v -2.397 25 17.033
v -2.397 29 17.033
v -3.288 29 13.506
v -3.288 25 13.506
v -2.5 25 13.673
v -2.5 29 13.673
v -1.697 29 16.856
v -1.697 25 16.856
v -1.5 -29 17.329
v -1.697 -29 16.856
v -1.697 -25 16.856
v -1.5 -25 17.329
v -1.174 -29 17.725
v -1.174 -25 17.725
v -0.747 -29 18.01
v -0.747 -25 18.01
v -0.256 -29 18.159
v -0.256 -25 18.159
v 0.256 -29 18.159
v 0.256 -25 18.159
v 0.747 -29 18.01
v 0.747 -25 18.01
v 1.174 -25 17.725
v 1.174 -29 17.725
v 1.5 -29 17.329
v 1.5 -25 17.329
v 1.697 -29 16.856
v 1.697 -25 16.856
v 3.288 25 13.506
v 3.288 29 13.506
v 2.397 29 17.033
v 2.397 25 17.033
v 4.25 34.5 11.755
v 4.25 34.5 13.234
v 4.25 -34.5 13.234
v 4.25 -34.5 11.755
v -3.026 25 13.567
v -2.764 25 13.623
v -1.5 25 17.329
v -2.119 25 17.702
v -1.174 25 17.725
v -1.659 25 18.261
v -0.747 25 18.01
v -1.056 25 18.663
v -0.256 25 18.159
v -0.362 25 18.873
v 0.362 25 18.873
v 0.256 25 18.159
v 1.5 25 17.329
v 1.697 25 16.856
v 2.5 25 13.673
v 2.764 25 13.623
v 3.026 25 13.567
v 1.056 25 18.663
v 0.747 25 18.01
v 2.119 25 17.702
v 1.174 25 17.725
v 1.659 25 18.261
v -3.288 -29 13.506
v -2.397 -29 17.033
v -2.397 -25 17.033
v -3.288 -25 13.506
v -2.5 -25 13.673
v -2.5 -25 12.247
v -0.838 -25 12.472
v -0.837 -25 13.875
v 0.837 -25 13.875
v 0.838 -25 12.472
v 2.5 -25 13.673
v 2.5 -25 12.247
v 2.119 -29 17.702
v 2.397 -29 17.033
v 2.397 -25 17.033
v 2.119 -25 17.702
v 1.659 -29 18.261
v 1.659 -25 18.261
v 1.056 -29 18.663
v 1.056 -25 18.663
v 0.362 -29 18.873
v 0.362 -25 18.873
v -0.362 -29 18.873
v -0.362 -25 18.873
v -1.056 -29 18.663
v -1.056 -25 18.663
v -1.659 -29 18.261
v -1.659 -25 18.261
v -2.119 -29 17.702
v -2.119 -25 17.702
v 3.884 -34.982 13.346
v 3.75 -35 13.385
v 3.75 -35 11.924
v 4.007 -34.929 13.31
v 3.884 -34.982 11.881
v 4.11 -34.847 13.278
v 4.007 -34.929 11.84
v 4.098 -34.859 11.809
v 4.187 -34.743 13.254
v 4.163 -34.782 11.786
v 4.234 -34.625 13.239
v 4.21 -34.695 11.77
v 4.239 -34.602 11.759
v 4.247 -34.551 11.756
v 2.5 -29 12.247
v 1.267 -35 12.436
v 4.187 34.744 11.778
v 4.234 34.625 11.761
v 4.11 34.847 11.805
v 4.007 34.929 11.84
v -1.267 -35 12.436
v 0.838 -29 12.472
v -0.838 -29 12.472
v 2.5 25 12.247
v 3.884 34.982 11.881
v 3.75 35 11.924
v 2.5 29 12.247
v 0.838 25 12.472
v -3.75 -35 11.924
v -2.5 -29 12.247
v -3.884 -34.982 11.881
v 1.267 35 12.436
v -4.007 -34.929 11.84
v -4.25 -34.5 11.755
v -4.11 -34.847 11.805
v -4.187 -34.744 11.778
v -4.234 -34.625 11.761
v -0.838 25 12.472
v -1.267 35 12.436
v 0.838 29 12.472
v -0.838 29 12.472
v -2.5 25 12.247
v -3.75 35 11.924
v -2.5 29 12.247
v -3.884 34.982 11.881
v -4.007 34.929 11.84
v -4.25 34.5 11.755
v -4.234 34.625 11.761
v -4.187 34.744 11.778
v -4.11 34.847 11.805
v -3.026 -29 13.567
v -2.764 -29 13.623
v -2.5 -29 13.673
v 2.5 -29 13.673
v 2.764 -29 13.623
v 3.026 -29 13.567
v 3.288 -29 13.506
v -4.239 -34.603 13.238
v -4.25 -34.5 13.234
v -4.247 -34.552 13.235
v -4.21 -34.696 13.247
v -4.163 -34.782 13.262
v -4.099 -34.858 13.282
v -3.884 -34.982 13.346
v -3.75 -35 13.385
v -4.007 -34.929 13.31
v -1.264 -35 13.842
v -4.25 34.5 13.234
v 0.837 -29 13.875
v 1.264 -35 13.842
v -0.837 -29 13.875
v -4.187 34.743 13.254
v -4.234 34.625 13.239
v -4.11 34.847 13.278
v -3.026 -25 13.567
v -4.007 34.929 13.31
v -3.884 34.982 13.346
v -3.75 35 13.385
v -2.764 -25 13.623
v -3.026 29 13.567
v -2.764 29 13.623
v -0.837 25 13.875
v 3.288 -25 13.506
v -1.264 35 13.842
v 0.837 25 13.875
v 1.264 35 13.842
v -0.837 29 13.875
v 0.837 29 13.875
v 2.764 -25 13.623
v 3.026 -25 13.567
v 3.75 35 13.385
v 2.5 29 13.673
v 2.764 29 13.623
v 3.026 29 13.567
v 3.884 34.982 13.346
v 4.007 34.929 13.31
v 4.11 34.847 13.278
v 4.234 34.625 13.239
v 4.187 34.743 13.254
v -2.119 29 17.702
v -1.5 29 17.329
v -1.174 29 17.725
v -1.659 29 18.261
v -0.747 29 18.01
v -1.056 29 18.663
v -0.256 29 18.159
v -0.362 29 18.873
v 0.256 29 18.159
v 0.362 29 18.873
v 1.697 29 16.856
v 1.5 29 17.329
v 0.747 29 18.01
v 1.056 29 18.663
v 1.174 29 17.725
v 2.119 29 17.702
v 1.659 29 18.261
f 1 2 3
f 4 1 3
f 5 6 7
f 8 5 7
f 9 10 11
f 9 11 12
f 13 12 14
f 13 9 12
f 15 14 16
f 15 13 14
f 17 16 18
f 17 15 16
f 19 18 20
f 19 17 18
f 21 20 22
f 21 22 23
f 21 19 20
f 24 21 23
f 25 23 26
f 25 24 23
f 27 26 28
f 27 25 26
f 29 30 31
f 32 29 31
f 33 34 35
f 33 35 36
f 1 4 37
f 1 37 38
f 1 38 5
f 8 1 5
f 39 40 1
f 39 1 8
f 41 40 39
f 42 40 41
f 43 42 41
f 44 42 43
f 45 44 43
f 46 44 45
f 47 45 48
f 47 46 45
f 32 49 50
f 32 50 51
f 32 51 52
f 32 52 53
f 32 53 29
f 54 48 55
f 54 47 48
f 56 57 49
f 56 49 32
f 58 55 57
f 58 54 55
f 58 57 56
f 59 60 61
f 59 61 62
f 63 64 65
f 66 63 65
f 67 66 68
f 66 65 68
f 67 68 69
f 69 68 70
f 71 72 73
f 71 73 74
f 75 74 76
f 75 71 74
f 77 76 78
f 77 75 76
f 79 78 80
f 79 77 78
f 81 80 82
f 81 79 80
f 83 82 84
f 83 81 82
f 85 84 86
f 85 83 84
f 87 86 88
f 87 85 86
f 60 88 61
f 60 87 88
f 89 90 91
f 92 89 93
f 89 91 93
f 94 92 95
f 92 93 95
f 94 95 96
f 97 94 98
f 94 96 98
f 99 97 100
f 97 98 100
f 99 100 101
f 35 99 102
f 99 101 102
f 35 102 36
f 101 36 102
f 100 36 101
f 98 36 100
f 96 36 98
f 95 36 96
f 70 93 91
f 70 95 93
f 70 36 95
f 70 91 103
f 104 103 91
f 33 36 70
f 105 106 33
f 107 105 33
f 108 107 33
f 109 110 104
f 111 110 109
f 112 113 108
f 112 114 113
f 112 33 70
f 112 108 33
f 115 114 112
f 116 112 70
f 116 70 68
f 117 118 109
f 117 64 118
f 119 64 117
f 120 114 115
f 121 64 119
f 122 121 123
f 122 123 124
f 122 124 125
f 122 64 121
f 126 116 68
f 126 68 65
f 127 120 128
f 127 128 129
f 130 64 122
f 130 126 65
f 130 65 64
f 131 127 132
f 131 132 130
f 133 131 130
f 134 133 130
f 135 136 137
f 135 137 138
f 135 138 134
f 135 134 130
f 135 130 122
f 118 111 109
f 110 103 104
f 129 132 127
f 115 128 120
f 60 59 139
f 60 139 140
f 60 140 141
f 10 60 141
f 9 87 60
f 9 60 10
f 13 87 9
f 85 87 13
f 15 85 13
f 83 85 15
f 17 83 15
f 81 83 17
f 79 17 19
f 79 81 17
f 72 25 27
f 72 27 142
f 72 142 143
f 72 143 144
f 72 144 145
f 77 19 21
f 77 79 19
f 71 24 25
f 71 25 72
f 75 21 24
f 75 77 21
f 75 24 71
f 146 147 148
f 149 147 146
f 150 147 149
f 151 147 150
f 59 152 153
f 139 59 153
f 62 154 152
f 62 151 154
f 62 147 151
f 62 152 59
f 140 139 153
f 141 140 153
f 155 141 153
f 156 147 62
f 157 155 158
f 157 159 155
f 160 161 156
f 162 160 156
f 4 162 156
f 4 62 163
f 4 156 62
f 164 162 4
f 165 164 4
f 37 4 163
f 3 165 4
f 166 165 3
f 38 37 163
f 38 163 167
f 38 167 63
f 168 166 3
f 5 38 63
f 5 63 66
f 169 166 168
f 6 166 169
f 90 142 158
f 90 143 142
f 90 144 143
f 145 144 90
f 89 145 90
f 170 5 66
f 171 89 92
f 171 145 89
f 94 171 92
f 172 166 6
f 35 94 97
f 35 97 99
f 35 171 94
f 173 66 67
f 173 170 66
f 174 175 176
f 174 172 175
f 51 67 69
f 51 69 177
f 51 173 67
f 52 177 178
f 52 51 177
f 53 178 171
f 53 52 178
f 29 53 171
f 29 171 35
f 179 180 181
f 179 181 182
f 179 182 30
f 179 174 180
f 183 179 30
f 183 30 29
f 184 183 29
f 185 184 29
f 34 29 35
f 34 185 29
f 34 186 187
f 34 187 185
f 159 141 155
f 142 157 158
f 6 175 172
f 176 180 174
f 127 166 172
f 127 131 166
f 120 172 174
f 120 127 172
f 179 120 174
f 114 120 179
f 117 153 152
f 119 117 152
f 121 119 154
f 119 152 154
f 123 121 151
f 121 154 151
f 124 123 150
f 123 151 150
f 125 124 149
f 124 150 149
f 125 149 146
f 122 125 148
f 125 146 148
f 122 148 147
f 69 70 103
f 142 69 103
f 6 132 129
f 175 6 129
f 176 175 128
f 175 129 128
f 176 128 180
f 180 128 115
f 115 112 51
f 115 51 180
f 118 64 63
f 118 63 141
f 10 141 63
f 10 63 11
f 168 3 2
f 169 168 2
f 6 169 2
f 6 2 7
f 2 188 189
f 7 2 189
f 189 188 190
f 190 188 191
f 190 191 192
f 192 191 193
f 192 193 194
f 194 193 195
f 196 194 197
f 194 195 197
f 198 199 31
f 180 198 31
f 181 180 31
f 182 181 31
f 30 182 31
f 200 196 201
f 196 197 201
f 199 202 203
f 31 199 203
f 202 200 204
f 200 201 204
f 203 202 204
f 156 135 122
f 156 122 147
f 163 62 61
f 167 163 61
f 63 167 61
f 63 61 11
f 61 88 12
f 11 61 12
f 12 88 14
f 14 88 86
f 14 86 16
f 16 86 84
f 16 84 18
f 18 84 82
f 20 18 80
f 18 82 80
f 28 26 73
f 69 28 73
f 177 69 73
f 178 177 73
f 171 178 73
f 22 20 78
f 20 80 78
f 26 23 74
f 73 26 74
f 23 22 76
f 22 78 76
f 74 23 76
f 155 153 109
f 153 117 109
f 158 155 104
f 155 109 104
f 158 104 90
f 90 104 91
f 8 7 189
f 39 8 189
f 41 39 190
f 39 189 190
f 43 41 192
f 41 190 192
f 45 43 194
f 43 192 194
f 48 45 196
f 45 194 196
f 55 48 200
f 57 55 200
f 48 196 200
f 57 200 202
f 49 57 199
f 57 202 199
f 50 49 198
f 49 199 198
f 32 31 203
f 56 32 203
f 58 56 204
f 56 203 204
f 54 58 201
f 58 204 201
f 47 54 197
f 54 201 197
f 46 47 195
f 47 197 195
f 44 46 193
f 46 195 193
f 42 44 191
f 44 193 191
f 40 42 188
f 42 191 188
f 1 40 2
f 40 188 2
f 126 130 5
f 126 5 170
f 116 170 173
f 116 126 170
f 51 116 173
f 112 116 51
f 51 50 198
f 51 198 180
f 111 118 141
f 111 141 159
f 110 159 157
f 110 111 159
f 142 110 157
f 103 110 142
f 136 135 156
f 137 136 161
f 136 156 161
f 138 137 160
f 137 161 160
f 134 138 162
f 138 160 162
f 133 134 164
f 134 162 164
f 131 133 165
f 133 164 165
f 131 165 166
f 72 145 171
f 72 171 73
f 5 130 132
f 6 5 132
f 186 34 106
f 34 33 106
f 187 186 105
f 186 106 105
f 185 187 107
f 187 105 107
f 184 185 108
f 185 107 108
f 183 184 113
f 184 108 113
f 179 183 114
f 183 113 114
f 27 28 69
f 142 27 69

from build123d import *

# Parameters (mm, degrees)
PROFILE_DEPTH    = 35
SUPPORTCUTS_W    = 5
SUPPORTCUTS_H    = 4
SUPPORTCUT_DEPTH = 38.898185972
RODGUIDE_DEPTH   = 4
PROFILEFILLET_R  = 0.5


with BuildPart() as part:
    # ProfileS → Profile (new, symmetric)
    with BuildSketch(Plane(origin=(0, 0, 0), x_dir=(1, 0, 0), z_dir=(0, 1, 0))):
        with BuildLine():
            Line((-4.25, -11.755317946), (-4.25, -13.234330357))
            ThreePointArc((-4.25, -13.234330357), (0, -13.9), (4.25, -13.234330357))
            Line((4.25, -13.234330357), (4.25, -11.755317946))
            ThreePointArc((4.25, -11.755317946), (0, -12.5), (-4.25, -11.755317946))
        make_face()
    extrude(amount=PROFILE_DEPTH, both=True)

    # SupportCutS → SupportCut (cut, through all)
    with BuildSketch(Plane.XY):
        with Locations((0, 27)):
            Rectangle(SUPPORTCUTS_W, SUPPORTCUTS_H)
    supportcut = extrude(amount=SUPPORTCUT_DEPTH, mode=Mode.SUBTRACT)

    # RodGuideS → RodGuide (add)
    with BuildSketch(Plane.XZ.offset(-29)):
        with BuildLine():
            Line((-2.5, 13.673331708), (-1.696790343, 16.855729335))
            ThreePointArc((-1.696790343, 16.855729335), (0, 18.177474117), (1.696790343, 16.855729335))
            Line((1.696790343, 16.855729335), (2.5, 13.673331708))
            ThreePointArc((2.5, 13.673331708), (2.894968306, 13.5951888), (3.287507688, 13.505639311))
            Line((3.287507688, 13.505639311), (2.397347452, 17.032543895))
            ThreePointArc((2.397347452, 17.032543895), (0, 18.9), (-2.397347452, 17.032543895))
            Line((-2.397347452, 17.032543895), (-3.287507688, 13.505639311))
            ThreePointArc((-3.287507688, 13.505639311), (-2.894968306, 13.5951888), (-2.5, 13.673331708))
        make_face()
    rodguide = extrude(amount=RODGUIDE_DEPTH)

    # SCVM: SupportCut, RodGuide across plane
    add(supportcut.mirror(Plane.ZX), mode=Mode.SUBTRACT)
    add(rodguide.mirror(Plane.ZX))

    # ProfileFillet
    profilefillet_edges = [part.edges().sort_by_distance(p)[0] for p in [
        (4.25, 35, 12.494824151),
        (4.25, -35, 12.494824151),
        (-4.25, -35, 12.494824151),
        (-4.25, 35, 12.494824151),
    ]]
    fillet(profilefillet_edges, radius=PROFILEFILLET_R)


solid = part.part
